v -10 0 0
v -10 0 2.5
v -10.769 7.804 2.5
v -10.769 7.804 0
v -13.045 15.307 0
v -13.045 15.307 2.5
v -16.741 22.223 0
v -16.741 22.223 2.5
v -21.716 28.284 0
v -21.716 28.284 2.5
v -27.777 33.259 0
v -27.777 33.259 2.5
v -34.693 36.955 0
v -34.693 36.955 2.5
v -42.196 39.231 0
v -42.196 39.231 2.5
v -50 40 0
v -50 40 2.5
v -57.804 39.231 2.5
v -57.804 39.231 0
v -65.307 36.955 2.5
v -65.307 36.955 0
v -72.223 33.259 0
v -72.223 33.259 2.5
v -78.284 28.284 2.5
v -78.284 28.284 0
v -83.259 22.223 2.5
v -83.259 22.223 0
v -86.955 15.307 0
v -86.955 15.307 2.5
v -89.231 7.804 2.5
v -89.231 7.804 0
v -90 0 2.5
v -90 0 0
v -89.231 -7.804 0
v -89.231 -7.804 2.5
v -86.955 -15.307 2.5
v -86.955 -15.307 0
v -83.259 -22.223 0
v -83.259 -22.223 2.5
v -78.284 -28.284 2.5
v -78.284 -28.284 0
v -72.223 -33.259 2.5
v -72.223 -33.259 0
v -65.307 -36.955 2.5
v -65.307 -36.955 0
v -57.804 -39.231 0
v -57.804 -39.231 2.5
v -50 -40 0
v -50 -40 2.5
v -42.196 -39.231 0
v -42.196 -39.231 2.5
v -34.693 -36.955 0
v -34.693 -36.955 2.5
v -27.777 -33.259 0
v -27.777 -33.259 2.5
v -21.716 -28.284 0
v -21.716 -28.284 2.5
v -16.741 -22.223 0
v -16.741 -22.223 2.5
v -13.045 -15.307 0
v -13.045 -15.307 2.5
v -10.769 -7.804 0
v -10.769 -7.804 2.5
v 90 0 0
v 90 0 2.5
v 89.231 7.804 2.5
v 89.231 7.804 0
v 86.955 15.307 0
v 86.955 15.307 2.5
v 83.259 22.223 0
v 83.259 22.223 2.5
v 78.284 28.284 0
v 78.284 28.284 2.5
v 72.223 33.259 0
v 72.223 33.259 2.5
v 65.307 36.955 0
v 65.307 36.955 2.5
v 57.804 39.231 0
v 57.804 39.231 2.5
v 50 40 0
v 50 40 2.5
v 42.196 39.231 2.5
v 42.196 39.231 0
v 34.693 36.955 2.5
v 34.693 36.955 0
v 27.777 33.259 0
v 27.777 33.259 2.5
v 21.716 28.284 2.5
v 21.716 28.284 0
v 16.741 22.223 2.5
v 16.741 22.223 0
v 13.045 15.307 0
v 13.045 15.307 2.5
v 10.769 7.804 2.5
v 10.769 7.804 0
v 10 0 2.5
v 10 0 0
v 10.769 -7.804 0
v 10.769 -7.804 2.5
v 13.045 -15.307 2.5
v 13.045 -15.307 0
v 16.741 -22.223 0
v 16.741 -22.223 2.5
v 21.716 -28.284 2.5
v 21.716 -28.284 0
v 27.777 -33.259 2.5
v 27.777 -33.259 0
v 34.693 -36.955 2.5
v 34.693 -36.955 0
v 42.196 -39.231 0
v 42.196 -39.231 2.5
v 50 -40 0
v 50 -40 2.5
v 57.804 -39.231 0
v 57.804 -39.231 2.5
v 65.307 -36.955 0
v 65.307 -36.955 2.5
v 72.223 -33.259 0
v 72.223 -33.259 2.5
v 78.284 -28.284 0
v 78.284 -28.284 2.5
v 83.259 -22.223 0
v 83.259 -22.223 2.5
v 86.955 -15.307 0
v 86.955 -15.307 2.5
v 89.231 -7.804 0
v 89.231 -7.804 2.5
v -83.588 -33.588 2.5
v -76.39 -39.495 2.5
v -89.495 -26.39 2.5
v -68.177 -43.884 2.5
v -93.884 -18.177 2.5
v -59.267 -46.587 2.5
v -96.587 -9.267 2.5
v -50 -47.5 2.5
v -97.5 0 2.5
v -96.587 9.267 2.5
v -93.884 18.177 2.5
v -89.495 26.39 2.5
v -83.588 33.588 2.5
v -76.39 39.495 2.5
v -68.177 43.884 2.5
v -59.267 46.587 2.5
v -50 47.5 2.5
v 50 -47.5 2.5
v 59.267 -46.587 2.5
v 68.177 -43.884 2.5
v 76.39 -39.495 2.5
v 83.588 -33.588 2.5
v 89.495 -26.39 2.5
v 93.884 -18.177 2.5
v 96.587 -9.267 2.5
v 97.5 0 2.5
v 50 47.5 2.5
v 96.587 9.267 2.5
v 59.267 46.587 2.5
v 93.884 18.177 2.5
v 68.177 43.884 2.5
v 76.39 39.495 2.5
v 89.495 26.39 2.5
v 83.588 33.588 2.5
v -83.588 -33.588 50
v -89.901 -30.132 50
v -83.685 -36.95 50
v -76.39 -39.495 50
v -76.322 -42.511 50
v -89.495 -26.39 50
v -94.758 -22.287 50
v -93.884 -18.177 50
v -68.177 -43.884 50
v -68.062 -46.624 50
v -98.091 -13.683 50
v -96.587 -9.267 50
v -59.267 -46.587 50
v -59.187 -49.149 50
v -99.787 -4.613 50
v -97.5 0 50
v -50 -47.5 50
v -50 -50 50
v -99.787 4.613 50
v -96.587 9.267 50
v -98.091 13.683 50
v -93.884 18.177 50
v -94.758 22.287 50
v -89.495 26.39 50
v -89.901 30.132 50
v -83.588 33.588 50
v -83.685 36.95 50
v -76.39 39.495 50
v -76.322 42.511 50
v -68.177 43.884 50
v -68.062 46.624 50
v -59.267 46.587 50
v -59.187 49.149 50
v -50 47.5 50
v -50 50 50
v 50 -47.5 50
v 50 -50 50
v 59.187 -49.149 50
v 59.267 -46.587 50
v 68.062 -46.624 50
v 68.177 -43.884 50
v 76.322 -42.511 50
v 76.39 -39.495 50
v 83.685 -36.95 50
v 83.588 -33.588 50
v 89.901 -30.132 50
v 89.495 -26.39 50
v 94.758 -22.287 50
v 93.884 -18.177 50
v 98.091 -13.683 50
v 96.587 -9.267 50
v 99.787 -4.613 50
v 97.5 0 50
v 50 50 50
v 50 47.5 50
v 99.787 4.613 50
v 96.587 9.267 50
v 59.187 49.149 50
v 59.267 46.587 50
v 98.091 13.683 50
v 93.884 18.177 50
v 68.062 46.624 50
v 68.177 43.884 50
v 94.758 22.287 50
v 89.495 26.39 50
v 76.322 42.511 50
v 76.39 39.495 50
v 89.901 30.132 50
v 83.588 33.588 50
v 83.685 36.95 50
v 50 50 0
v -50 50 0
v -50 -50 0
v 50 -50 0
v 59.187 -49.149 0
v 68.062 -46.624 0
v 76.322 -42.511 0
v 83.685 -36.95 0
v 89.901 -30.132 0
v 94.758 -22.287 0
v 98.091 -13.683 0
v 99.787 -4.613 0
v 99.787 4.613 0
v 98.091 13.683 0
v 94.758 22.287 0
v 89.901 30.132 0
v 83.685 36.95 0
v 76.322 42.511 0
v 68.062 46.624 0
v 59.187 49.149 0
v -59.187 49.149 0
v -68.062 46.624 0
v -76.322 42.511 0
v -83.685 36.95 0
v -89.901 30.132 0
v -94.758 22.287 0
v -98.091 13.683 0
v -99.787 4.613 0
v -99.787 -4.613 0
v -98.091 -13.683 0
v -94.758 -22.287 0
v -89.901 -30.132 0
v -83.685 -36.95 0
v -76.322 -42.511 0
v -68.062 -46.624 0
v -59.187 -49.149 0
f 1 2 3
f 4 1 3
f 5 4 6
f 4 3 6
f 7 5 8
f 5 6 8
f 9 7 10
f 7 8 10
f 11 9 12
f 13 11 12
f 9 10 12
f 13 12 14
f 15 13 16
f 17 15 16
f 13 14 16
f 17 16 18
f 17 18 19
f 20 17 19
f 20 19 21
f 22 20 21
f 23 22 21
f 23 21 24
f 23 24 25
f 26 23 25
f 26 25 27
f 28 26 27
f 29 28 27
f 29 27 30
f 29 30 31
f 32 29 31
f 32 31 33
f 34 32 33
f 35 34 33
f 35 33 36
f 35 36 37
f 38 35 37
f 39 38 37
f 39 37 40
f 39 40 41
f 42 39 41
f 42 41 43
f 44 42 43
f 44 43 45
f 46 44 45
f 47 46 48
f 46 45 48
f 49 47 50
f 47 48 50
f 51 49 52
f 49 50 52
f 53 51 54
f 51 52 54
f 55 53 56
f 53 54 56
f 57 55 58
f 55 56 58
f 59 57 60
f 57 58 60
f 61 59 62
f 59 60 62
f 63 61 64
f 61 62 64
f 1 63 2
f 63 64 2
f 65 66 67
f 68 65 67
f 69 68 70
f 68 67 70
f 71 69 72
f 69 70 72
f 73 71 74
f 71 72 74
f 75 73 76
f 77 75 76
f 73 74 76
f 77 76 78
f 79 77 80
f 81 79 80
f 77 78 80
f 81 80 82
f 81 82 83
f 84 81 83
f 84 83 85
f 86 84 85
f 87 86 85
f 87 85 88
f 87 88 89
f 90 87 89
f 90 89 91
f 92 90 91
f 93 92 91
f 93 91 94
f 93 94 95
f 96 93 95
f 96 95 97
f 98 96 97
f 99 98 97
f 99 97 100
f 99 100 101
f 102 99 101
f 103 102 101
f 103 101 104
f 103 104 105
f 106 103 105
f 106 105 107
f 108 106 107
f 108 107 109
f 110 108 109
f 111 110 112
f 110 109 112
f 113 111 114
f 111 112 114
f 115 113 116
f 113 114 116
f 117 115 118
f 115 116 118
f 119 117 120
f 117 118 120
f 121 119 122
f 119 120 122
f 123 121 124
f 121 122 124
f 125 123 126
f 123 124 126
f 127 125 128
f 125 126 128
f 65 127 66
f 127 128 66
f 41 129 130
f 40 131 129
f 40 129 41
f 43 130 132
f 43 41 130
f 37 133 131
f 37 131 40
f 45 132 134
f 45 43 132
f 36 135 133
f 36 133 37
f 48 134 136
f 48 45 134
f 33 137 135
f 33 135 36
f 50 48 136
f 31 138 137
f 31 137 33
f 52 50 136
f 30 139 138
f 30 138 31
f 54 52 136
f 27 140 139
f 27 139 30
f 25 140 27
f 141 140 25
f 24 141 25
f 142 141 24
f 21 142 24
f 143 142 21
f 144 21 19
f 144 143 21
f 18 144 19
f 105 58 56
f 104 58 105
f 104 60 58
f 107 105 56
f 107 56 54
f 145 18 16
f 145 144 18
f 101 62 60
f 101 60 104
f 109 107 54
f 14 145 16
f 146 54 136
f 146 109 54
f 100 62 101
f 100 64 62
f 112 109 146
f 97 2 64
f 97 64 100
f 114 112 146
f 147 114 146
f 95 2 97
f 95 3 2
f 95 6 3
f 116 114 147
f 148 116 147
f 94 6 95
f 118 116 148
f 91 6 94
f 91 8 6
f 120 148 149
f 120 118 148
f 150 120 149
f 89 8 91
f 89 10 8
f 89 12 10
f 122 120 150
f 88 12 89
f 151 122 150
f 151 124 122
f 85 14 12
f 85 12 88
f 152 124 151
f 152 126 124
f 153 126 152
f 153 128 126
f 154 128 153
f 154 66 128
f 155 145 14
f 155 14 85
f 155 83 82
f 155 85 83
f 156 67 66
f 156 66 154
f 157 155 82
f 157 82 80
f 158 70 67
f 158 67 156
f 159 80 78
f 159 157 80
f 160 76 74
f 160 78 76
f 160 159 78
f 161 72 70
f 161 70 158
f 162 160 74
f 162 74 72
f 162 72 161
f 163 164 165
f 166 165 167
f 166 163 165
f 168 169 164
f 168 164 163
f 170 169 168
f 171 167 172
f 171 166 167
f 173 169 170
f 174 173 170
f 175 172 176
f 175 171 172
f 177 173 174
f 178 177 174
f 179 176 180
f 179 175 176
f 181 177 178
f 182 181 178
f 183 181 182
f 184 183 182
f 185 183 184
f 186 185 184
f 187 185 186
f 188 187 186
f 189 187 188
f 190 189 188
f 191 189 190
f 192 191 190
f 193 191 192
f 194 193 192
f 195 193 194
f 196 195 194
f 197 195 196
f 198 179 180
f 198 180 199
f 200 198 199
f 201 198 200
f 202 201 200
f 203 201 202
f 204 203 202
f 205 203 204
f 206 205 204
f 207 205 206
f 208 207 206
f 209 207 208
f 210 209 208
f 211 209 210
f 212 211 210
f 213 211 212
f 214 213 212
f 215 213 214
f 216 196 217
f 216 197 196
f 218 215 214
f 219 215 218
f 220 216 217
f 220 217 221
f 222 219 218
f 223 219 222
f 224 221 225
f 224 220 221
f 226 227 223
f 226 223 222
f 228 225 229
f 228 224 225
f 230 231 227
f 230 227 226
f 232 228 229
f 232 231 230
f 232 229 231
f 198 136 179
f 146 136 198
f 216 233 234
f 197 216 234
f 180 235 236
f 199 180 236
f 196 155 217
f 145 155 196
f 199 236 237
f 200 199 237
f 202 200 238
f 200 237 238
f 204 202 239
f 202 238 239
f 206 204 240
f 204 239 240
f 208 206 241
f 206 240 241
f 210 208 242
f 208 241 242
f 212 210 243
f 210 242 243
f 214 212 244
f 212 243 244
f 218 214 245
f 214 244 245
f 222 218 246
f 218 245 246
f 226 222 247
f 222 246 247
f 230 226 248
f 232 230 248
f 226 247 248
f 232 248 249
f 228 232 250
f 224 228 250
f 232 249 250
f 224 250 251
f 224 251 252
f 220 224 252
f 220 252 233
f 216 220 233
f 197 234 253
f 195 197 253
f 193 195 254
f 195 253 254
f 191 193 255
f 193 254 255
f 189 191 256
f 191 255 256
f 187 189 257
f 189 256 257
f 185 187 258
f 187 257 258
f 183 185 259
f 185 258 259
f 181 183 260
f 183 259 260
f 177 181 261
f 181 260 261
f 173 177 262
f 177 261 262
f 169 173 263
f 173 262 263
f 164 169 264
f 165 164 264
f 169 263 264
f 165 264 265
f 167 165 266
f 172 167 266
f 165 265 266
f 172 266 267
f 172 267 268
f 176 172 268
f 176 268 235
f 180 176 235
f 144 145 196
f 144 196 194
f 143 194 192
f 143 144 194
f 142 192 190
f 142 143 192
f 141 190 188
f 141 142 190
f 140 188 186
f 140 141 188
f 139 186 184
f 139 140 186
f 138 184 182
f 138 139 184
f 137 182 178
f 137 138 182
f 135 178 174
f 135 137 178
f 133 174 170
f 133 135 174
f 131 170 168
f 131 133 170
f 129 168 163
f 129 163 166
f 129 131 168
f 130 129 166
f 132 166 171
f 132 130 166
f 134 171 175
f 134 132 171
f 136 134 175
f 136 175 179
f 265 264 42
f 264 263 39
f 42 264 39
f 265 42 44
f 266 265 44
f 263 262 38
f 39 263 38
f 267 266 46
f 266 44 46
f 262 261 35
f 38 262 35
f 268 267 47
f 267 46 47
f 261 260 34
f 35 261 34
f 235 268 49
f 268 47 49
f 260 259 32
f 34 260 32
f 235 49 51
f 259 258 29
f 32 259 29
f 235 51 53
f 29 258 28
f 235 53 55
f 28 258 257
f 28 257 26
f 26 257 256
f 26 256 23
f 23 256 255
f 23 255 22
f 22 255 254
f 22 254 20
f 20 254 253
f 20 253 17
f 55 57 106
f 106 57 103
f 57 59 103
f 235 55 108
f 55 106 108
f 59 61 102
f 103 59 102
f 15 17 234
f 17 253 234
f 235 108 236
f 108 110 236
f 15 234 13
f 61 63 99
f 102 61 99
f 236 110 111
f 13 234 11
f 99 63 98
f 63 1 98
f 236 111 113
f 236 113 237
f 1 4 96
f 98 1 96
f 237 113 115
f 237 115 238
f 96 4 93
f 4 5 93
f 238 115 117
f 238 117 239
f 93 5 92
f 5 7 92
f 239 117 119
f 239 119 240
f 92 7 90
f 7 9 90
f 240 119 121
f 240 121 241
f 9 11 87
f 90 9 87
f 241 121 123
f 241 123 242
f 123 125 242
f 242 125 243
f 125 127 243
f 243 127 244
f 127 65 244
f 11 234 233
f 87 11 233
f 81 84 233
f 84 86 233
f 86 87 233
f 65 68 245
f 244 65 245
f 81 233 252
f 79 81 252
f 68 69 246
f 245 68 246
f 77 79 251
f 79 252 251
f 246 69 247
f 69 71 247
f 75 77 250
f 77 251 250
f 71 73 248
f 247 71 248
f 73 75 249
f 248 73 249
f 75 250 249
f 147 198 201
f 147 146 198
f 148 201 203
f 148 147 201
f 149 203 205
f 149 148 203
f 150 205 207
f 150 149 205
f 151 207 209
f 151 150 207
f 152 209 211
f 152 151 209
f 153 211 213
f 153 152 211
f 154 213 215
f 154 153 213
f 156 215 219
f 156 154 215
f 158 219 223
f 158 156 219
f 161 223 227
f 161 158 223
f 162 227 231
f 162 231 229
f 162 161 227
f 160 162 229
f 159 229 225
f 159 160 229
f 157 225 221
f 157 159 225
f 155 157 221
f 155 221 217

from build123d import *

# Parameters (mm, degrees)
F1_DEPTH = 50
F2_T     = -2.5
F3_R     = 40
F4_DEPTH = 25


with BuildPart() as f1:
    # F0 (on Top) → F1 (new body)
    with BuildSketch(Plane.XY):
        with BuildLine():
            Line((50, 50), (-50, 50))
            ThreePointArc((-50, 50), (-100, 0), (-50, -50))
            Line((-50, -50), (50, -50))
            ThreePointArc((50, -50), (100, 0), (50, 50))
        make_face()
    extrude(amount=F1_DEPTH)

    # F2
    f2_openings = [f1.faces().sort_by_distance(p)[0] for p in [
        (0, 0, 50),
    ]]
    offset(amount=F2_T, openings=f2_openings)

    # F3 (on face) → F4 (cut)
    with BuildSketch(Plane.XY.offset(2.5)):
        with Locations((-50, 0)):
            Circle(F3_R)
        with Locations((50, 0)):
            Circle(F3_R)
    extrude(amount=-F4_DEPTH, mode=Mode.SUBTRACT)


solid = f1.part
